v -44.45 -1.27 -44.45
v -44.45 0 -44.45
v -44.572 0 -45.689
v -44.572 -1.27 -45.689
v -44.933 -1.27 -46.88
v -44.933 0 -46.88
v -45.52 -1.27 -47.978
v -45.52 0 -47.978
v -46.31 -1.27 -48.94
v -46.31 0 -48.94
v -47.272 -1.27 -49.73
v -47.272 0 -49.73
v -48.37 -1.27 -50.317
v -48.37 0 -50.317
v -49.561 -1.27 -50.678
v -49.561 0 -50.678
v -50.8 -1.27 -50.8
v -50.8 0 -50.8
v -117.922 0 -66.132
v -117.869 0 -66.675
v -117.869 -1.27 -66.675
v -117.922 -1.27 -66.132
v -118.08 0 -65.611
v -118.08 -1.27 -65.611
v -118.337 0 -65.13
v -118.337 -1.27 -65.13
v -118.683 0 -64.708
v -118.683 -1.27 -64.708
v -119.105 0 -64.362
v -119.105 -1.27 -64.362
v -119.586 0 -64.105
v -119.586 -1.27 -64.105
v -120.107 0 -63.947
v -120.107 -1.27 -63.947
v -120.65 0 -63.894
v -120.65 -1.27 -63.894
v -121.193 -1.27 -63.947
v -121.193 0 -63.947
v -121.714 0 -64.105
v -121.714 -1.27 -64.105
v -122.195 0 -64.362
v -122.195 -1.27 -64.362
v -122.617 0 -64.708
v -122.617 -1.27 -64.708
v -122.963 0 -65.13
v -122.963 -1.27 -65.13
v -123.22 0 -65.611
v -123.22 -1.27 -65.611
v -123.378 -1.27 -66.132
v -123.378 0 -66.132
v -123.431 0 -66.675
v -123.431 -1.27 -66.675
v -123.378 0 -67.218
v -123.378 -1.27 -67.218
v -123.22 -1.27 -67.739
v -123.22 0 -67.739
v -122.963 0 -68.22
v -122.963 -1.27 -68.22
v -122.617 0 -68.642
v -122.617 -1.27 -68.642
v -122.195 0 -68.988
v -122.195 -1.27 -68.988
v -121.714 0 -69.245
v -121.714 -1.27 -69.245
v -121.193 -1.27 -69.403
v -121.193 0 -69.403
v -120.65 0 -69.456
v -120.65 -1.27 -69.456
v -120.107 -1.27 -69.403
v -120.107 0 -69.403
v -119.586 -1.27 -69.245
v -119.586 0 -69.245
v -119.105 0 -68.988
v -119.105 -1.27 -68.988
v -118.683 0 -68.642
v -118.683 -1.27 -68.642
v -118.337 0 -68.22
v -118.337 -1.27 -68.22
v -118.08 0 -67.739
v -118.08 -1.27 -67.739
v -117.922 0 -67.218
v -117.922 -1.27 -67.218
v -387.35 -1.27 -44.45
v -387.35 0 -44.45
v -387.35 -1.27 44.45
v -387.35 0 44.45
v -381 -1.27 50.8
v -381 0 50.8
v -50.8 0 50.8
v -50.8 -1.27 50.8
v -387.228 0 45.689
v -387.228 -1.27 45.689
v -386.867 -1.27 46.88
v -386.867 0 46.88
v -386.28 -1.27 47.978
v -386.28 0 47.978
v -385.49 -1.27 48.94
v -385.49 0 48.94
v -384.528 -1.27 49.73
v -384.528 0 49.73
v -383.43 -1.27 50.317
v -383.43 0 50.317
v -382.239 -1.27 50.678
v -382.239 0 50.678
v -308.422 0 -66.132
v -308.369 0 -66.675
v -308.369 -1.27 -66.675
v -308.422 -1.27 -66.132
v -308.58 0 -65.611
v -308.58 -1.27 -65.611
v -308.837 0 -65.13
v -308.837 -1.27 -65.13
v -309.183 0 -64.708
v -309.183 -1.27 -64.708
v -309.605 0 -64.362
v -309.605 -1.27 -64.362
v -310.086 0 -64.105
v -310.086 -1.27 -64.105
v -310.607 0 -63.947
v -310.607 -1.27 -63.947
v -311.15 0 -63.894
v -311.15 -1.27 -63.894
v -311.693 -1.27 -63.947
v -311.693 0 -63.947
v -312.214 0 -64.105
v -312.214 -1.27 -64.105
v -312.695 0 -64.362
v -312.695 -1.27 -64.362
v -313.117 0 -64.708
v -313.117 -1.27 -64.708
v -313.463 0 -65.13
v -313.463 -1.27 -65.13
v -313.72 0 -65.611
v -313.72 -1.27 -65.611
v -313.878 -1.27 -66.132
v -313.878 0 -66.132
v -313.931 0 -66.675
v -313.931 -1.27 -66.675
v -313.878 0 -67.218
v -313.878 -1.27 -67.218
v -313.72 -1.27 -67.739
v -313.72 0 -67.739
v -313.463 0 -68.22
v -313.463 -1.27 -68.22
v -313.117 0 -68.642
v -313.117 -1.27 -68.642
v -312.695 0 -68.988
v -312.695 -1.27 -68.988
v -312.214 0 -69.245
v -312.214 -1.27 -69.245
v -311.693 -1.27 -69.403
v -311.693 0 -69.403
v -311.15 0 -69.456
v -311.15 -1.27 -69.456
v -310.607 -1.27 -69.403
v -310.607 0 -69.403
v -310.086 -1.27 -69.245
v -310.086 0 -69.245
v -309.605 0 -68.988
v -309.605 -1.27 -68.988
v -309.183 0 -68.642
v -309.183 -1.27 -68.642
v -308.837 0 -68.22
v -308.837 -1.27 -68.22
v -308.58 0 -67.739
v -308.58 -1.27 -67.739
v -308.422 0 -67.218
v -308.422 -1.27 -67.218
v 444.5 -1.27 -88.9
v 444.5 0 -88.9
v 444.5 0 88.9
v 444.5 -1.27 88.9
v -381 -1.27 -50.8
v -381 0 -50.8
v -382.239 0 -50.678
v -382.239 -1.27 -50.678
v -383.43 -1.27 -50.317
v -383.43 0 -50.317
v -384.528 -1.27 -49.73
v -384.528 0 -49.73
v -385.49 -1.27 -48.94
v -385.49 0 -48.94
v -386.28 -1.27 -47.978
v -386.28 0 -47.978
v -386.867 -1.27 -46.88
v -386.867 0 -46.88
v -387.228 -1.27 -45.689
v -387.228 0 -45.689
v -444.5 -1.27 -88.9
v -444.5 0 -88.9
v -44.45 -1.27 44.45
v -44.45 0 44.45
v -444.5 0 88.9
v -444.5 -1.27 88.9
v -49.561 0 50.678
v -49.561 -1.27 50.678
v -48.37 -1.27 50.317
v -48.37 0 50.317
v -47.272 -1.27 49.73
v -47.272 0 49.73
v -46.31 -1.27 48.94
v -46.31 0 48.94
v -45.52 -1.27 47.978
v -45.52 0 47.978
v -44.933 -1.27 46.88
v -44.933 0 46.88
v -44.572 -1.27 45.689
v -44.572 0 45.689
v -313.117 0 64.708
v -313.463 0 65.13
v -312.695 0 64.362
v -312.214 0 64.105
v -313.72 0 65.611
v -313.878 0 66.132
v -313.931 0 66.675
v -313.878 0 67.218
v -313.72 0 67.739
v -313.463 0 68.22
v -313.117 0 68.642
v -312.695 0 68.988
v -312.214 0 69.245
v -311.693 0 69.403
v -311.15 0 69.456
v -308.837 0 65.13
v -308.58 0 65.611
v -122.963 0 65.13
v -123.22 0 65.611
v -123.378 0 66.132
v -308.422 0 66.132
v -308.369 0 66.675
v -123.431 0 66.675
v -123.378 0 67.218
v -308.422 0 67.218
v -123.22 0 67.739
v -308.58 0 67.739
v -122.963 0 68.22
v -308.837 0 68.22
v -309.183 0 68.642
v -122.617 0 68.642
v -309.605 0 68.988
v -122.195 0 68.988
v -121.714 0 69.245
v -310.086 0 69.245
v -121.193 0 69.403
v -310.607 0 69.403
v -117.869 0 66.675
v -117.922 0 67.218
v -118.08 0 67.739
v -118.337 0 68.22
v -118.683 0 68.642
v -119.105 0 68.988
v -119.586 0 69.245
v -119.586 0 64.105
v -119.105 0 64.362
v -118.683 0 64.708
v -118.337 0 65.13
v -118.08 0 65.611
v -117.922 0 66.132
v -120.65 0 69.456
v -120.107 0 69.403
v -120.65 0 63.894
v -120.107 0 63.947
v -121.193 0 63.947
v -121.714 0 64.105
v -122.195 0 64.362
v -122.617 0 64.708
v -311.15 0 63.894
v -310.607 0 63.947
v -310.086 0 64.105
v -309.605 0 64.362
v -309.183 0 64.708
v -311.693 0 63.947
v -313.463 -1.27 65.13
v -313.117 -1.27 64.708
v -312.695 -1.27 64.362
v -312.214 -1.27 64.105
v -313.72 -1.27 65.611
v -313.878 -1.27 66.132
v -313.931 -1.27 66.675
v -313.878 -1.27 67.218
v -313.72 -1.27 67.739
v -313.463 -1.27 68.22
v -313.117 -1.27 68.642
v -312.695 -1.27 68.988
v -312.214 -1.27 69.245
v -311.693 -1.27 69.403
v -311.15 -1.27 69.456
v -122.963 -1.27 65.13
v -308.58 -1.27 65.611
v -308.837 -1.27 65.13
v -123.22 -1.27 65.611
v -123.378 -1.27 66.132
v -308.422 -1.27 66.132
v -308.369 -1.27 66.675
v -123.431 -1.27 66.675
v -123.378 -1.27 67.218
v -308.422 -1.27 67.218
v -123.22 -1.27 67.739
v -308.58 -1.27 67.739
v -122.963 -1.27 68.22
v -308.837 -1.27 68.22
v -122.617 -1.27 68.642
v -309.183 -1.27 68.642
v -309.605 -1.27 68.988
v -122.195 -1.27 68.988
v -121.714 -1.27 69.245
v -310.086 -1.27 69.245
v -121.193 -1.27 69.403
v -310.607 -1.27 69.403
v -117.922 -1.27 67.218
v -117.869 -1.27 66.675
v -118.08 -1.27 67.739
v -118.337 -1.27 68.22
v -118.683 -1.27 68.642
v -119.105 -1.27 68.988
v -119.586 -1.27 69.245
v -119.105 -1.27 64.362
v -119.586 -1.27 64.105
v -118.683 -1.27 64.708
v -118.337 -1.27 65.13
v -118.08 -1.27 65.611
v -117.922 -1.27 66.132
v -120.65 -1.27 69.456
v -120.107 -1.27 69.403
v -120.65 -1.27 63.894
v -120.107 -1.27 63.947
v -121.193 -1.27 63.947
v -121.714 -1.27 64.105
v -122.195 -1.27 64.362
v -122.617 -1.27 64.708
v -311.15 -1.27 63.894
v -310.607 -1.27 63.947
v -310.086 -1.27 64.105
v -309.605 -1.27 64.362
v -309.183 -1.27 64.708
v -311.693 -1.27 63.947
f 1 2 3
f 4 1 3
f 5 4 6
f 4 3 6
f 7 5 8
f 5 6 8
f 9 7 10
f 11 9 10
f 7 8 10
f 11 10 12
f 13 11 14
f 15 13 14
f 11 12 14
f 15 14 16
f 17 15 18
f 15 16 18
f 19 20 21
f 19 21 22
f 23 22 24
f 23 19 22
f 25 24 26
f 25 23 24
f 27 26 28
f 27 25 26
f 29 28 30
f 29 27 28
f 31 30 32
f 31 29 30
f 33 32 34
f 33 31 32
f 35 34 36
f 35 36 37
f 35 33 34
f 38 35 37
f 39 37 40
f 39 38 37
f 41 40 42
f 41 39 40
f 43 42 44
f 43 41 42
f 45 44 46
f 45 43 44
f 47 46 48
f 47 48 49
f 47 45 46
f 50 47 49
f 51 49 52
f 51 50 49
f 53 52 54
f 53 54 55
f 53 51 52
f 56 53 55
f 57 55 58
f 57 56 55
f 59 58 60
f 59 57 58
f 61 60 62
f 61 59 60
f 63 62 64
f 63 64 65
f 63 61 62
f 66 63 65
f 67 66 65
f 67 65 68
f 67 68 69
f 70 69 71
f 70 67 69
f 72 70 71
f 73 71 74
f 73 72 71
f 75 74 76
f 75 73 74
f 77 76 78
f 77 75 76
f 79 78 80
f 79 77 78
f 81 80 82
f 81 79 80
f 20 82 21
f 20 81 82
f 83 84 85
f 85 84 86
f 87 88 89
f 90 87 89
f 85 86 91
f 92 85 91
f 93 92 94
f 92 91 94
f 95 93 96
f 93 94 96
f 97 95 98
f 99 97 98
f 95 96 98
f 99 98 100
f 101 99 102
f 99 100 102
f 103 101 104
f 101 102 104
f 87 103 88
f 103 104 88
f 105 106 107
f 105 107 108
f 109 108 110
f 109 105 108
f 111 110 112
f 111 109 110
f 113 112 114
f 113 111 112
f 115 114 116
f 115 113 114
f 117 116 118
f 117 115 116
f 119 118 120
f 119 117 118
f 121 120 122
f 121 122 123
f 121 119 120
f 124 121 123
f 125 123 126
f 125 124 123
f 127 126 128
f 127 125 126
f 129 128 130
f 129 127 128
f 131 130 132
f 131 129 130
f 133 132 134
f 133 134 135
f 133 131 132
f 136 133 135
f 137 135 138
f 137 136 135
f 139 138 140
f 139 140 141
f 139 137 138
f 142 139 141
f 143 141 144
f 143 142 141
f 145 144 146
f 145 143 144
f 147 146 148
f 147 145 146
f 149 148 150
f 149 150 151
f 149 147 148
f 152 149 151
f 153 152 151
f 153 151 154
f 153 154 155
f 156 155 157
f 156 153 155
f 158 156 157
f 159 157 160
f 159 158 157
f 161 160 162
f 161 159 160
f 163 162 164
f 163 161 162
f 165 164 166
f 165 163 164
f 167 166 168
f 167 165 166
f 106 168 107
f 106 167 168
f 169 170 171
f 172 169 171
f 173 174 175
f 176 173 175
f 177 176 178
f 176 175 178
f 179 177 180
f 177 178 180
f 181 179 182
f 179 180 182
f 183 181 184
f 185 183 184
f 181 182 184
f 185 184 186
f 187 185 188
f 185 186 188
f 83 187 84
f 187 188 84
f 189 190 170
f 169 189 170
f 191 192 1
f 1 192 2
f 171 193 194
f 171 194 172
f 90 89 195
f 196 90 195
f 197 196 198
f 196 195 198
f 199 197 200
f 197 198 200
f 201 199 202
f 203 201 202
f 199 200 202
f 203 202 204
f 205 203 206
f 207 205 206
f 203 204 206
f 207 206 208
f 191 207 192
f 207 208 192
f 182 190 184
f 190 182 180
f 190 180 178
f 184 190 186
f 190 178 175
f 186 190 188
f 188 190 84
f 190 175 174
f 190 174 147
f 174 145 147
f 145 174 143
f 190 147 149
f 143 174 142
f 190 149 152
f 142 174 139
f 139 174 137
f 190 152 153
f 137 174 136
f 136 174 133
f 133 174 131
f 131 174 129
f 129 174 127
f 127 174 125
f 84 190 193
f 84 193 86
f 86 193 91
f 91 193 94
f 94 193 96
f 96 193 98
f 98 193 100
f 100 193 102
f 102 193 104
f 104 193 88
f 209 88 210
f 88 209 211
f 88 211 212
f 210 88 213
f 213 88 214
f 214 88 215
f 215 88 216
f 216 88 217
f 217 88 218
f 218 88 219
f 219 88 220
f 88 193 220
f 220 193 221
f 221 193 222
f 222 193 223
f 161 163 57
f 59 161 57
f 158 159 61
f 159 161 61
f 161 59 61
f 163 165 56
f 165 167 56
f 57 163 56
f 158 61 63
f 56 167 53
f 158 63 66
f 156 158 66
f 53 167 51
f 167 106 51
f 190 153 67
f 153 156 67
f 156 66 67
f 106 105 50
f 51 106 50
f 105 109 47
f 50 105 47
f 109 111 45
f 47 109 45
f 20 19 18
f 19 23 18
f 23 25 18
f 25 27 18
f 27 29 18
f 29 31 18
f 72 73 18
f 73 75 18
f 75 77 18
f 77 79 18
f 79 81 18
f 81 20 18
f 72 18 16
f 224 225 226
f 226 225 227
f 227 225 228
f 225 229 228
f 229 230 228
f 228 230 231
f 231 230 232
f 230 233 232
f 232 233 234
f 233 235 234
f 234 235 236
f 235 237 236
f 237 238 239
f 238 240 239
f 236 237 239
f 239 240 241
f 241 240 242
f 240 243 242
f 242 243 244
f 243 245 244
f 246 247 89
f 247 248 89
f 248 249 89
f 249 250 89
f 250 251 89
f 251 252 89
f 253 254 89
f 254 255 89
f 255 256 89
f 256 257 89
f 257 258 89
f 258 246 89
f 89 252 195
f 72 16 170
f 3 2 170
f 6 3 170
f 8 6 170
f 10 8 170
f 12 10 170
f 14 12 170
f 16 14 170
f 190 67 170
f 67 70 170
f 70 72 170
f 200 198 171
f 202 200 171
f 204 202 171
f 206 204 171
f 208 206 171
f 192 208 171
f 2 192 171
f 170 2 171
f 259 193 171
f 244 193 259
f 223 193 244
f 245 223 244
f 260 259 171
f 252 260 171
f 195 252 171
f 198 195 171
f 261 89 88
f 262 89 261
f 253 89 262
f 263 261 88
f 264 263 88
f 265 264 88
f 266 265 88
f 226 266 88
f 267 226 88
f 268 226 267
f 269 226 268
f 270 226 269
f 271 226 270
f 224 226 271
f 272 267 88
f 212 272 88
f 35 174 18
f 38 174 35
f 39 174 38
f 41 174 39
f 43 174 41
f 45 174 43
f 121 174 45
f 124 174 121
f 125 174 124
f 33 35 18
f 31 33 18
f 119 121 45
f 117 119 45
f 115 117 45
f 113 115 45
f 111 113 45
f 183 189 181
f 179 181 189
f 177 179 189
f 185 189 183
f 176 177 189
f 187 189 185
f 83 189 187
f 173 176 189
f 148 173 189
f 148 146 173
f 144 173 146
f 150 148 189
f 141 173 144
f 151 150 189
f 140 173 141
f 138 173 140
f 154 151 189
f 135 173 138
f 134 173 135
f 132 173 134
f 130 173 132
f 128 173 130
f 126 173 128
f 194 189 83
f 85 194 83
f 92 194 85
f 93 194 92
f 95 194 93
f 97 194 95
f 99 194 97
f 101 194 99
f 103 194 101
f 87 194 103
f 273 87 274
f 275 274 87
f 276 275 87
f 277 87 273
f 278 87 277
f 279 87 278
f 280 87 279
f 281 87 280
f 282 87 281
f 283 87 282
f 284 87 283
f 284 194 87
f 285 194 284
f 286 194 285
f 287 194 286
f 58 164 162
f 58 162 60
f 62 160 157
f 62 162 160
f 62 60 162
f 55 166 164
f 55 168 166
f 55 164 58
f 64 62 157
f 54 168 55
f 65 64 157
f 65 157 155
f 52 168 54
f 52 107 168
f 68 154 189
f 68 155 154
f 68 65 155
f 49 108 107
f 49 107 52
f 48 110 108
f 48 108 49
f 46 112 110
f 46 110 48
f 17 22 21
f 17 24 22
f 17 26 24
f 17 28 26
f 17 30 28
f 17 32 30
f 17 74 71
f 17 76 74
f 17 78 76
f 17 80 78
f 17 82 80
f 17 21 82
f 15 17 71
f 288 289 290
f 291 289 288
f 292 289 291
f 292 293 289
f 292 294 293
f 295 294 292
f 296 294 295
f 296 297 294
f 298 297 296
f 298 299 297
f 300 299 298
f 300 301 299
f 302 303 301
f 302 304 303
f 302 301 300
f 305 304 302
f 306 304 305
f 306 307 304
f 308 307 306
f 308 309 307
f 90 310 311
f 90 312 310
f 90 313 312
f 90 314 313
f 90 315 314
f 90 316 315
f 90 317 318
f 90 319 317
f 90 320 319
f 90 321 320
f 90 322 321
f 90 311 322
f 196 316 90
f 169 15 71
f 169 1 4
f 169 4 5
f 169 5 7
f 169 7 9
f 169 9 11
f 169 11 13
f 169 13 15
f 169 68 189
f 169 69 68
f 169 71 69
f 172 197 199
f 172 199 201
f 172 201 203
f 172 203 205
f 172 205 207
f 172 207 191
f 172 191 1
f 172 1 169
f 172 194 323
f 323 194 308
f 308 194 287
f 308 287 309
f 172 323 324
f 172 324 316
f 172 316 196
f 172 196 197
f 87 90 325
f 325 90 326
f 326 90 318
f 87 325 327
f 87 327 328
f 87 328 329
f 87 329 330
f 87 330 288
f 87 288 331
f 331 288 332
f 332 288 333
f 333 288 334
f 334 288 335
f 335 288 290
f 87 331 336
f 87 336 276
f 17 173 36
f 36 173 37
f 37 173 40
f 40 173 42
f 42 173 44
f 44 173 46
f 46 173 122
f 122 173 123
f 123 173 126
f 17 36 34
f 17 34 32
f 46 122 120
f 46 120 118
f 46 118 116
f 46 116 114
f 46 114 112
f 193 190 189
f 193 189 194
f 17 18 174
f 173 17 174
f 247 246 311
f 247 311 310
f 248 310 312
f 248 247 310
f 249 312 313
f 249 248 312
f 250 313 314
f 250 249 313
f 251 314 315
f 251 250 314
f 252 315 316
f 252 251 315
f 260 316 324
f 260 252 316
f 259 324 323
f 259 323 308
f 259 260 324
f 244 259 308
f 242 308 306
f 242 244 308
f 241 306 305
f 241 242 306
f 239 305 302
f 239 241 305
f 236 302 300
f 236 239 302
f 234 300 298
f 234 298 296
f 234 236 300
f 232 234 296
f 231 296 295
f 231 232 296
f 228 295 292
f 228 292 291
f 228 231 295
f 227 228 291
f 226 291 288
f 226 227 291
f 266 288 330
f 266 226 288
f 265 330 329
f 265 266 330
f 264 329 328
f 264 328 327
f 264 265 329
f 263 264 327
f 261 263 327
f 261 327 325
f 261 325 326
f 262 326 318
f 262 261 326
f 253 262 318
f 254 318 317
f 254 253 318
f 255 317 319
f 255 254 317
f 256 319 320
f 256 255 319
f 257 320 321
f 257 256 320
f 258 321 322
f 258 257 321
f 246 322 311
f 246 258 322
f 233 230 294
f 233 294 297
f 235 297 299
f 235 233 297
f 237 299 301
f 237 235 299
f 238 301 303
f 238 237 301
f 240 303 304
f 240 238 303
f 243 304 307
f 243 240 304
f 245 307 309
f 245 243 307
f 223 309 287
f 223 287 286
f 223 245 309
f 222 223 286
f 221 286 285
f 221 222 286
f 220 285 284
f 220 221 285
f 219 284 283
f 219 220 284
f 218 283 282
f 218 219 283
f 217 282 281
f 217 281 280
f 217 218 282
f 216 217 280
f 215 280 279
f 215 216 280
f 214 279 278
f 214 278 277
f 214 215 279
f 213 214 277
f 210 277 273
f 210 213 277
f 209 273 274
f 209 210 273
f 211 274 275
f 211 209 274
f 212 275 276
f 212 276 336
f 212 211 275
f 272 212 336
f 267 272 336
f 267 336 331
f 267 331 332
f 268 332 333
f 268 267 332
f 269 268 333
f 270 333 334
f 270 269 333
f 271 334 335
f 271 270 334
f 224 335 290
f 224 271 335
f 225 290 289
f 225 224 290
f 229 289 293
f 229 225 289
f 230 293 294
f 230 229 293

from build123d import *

# Parameters (mm, degrees)
F0_W     = 889
F0_H     = 177.8
F0_R     = 2.7813
F1_DEPTH = 1.27


with BuildPart() as f1:
    # F0 (on Front) → F1 (new body)
    with BuildSketch(Plane.XZ):
        Rectangle(F0_W, F0_H)
        with Locations((-311.15, -66.675)):
            Circle(F0_R, mode=Mode.SUBTRACT)
        with Locations((-120.65, -66.675)):
            Circle(F0_R, mode=Mode.SUBTRACT)
        with BuildLine():
            Line((-381, 50.8), (-50.8, 50.8))
            ThreePointArc((-50.8, 50.8), (-46.309872, 48.940128), (-44.45, 44.45))
            Line((-44.45, 44.45), (-44.45, -44.45))
            ThreePointArc((-44.45, -44.45), (-46.309872, -48.940128), (-50.8, -50.8))
            Line((-50.8, -50.8), (-381, -50.8))
            ThreePointArc((-381, -50.8), (-385.490128, -48.940128), (-387.35, -44.45))
            Line((-387.35, -44.45), (-387.35, 44.45))
            ThreePointArc((-387.35, 44.45), (-385.490128, 48.940128), (-381, 50.8))
        make_face(mode=Mode.SUBTRACT)
        with Locations((-311.15, 66.675)):
            Circle(F0_R, mode=Mode.SUBTRACT)
        with Locations((-120.65, 66.675)):
            Circle(F0_R, mode=Mode.SUBTRACT)
    extrude(amount=F1_DEPTH)


solid = f1.part
